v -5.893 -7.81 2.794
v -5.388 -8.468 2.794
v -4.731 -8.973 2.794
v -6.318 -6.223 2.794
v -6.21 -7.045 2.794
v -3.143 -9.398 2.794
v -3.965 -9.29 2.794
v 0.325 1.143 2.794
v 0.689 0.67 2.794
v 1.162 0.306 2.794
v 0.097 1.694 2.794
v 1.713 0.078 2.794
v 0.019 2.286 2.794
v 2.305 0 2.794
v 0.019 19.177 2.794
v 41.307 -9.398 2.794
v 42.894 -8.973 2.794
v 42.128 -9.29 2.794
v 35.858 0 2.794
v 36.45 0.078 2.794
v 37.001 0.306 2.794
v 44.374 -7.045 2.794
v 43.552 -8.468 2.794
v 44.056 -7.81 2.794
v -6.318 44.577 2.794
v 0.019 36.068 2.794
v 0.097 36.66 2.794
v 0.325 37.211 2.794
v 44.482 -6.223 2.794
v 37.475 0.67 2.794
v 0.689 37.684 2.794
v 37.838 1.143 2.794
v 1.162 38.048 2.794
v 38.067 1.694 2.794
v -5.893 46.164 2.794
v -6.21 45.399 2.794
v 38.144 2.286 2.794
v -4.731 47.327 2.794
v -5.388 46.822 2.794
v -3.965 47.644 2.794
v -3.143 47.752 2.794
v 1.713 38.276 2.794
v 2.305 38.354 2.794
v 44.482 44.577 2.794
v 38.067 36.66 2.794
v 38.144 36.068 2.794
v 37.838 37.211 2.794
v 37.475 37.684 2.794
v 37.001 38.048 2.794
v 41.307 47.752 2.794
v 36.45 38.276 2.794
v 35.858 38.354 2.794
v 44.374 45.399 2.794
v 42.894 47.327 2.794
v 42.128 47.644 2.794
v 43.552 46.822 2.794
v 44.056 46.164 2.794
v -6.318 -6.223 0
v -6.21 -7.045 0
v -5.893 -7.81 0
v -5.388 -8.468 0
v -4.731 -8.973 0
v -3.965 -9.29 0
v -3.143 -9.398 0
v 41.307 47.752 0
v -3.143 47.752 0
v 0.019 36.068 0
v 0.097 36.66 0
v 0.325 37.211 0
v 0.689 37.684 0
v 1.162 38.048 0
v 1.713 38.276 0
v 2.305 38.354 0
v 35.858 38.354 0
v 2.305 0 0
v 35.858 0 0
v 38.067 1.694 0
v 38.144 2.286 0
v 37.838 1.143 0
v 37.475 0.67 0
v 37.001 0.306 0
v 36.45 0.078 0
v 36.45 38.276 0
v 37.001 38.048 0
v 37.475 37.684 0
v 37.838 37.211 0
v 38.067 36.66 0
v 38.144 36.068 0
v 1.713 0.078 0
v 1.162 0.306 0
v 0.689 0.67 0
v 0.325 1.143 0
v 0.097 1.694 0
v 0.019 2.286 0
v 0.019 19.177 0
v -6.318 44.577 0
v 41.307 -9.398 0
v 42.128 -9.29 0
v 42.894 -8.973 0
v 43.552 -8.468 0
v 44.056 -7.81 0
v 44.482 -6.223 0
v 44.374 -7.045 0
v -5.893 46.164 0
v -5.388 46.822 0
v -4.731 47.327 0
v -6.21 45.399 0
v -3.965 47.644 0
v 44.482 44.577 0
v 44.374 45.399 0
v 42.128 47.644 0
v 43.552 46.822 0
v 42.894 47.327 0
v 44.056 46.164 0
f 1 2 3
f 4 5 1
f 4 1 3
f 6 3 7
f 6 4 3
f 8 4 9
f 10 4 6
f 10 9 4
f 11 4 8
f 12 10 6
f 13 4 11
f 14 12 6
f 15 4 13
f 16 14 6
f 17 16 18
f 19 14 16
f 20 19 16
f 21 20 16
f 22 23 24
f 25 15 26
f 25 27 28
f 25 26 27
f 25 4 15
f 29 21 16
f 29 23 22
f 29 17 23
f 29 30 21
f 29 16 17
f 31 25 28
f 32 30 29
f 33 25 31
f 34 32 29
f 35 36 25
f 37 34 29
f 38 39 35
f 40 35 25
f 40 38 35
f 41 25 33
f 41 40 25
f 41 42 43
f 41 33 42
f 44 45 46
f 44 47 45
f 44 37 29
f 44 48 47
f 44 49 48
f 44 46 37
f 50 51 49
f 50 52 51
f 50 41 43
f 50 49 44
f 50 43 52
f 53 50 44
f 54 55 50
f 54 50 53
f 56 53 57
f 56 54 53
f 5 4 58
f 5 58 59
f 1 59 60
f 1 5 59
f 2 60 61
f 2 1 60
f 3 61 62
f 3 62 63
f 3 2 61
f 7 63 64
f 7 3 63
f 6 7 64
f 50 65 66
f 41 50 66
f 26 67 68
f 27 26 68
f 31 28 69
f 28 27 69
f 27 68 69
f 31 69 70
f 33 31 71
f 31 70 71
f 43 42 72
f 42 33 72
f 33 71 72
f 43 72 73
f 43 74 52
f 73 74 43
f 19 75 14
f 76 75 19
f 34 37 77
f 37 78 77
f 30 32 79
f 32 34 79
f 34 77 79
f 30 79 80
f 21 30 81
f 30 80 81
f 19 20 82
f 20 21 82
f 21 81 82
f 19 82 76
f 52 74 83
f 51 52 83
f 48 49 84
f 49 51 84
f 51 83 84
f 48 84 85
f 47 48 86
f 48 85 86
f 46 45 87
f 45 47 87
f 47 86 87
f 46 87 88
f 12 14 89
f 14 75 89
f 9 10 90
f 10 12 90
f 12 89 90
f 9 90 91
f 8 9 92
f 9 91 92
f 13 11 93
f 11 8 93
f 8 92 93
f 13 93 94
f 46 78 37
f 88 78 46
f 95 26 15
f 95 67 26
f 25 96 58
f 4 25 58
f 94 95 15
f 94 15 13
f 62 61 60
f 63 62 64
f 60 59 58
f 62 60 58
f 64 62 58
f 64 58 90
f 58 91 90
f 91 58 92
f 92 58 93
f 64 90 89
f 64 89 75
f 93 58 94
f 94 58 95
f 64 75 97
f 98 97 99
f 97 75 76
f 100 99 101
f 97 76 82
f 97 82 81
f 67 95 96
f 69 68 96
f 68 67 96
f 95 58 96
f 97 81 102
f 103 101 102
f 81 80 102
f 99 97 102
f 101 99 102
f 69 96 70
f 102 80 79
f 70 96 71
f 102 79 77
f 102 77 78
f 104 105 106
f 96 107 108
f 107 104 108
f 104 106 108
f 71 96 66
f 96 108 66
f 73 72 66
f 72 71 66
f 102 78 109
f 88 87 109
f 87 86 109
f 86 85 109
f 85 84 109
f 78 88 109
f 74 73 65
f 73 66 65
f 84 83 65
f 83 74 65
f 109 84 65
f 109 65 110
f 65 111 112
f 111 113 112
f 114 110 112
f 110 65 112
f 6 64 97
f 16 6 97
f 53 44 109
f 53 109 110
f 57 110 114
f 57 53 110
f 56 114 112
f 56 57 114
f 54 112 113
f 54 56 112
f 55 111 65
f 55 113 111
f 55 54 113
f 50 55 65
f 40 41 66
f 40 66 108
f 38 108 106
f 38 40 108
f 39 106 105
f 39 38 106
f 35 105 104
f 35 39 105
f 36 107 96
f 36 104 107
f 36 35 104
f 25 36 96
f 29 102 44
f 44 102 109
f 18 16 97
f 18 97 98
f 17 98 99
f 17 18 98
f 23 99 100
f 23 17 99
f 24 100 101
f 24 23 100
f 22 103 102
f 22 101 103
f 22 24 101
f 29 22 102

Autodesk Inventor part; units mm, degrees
ref_plane "YZ Plane" through (0, 0, 0) normal (1, 0, 0) x (0, 1, 0)
ref_plane "XZ Plane" through (0, 0, 0) normal (0, 1, 0) x (-1, 0, 0)
ref_plane "XY Plane" through (0, 0, 0) normal (0, 0, 1) x (1, 0, 0)
sketch "Sketch1" plane through (0, 0, 0) normal (0, 0, 1) x (1, 0, 0)
  line L0 (0, 19.177) -> (19.0817, 19.177)
  line L1 (-6.3183, -9.398) -> (44.4817, -9.398)
  line L2 (44.4817, -9.398) -> (44.4817, 47.752)
  line L3 (44.4817, 47.752) -> (-6.3183, 47.752)
  line L4 (-6.3183, 47.752) -> (-6.3183, -9.398)
  line L5 (-6.3183, -9.398) -> (44.4817, 47.752) construction
  line L6 (44.4817, -9.398) -> (-6.3183, 47.752) construction
  line L7 (2.305, 0) -> (35.8584, 0)
  line L8 (38.1444, 2.286) -> (38.1444, 36.068)
  line L9 (35.8584, 38.354) -> (2.305, 38.354)
  line L10 (0.019, 36.068) -> (0.019, 2.286)
  line L11 (0.019, 0) -> (38.1444, 38.354) construction
  line L12 (38.1444, 0) -> (0.019, 38.354) construction
  arc A0 (2.305, 38.354) -> (0.019, 36.068) centre (2.305, 36.068) ccw
  arc A1 (38.1444, 36.068) -> (35.8584, 38.354) centre (35.8584, 36.068) ccw
  arc A2 (35.8584, 0) -> (38.1444, 2.286) centre (35.8584, 2.286) ccw
  arc A3 (0.019, 2.286) -> (2.305, 0) centre (2.305, 2.286) ccw
  dimension "d15" = 50.8
  dimension "d16" = 57.15
  dimension "d19" = 38.1254
  dimension "d20" = 38.354
  dimension "d21" = 2.286
extrude "Extrusion1" add sketch "Sketch1" along normal blind 2.794
fillet "Fillet4" radius 3.175 4 edges at (-6.3183, 47.752, 1.397) (44.4817, 47.752, 1.397) (44.4817, -9.398, 1.397) (-6.3183, -9.398, 1.397)
properties part number "ESC Hole Test"
